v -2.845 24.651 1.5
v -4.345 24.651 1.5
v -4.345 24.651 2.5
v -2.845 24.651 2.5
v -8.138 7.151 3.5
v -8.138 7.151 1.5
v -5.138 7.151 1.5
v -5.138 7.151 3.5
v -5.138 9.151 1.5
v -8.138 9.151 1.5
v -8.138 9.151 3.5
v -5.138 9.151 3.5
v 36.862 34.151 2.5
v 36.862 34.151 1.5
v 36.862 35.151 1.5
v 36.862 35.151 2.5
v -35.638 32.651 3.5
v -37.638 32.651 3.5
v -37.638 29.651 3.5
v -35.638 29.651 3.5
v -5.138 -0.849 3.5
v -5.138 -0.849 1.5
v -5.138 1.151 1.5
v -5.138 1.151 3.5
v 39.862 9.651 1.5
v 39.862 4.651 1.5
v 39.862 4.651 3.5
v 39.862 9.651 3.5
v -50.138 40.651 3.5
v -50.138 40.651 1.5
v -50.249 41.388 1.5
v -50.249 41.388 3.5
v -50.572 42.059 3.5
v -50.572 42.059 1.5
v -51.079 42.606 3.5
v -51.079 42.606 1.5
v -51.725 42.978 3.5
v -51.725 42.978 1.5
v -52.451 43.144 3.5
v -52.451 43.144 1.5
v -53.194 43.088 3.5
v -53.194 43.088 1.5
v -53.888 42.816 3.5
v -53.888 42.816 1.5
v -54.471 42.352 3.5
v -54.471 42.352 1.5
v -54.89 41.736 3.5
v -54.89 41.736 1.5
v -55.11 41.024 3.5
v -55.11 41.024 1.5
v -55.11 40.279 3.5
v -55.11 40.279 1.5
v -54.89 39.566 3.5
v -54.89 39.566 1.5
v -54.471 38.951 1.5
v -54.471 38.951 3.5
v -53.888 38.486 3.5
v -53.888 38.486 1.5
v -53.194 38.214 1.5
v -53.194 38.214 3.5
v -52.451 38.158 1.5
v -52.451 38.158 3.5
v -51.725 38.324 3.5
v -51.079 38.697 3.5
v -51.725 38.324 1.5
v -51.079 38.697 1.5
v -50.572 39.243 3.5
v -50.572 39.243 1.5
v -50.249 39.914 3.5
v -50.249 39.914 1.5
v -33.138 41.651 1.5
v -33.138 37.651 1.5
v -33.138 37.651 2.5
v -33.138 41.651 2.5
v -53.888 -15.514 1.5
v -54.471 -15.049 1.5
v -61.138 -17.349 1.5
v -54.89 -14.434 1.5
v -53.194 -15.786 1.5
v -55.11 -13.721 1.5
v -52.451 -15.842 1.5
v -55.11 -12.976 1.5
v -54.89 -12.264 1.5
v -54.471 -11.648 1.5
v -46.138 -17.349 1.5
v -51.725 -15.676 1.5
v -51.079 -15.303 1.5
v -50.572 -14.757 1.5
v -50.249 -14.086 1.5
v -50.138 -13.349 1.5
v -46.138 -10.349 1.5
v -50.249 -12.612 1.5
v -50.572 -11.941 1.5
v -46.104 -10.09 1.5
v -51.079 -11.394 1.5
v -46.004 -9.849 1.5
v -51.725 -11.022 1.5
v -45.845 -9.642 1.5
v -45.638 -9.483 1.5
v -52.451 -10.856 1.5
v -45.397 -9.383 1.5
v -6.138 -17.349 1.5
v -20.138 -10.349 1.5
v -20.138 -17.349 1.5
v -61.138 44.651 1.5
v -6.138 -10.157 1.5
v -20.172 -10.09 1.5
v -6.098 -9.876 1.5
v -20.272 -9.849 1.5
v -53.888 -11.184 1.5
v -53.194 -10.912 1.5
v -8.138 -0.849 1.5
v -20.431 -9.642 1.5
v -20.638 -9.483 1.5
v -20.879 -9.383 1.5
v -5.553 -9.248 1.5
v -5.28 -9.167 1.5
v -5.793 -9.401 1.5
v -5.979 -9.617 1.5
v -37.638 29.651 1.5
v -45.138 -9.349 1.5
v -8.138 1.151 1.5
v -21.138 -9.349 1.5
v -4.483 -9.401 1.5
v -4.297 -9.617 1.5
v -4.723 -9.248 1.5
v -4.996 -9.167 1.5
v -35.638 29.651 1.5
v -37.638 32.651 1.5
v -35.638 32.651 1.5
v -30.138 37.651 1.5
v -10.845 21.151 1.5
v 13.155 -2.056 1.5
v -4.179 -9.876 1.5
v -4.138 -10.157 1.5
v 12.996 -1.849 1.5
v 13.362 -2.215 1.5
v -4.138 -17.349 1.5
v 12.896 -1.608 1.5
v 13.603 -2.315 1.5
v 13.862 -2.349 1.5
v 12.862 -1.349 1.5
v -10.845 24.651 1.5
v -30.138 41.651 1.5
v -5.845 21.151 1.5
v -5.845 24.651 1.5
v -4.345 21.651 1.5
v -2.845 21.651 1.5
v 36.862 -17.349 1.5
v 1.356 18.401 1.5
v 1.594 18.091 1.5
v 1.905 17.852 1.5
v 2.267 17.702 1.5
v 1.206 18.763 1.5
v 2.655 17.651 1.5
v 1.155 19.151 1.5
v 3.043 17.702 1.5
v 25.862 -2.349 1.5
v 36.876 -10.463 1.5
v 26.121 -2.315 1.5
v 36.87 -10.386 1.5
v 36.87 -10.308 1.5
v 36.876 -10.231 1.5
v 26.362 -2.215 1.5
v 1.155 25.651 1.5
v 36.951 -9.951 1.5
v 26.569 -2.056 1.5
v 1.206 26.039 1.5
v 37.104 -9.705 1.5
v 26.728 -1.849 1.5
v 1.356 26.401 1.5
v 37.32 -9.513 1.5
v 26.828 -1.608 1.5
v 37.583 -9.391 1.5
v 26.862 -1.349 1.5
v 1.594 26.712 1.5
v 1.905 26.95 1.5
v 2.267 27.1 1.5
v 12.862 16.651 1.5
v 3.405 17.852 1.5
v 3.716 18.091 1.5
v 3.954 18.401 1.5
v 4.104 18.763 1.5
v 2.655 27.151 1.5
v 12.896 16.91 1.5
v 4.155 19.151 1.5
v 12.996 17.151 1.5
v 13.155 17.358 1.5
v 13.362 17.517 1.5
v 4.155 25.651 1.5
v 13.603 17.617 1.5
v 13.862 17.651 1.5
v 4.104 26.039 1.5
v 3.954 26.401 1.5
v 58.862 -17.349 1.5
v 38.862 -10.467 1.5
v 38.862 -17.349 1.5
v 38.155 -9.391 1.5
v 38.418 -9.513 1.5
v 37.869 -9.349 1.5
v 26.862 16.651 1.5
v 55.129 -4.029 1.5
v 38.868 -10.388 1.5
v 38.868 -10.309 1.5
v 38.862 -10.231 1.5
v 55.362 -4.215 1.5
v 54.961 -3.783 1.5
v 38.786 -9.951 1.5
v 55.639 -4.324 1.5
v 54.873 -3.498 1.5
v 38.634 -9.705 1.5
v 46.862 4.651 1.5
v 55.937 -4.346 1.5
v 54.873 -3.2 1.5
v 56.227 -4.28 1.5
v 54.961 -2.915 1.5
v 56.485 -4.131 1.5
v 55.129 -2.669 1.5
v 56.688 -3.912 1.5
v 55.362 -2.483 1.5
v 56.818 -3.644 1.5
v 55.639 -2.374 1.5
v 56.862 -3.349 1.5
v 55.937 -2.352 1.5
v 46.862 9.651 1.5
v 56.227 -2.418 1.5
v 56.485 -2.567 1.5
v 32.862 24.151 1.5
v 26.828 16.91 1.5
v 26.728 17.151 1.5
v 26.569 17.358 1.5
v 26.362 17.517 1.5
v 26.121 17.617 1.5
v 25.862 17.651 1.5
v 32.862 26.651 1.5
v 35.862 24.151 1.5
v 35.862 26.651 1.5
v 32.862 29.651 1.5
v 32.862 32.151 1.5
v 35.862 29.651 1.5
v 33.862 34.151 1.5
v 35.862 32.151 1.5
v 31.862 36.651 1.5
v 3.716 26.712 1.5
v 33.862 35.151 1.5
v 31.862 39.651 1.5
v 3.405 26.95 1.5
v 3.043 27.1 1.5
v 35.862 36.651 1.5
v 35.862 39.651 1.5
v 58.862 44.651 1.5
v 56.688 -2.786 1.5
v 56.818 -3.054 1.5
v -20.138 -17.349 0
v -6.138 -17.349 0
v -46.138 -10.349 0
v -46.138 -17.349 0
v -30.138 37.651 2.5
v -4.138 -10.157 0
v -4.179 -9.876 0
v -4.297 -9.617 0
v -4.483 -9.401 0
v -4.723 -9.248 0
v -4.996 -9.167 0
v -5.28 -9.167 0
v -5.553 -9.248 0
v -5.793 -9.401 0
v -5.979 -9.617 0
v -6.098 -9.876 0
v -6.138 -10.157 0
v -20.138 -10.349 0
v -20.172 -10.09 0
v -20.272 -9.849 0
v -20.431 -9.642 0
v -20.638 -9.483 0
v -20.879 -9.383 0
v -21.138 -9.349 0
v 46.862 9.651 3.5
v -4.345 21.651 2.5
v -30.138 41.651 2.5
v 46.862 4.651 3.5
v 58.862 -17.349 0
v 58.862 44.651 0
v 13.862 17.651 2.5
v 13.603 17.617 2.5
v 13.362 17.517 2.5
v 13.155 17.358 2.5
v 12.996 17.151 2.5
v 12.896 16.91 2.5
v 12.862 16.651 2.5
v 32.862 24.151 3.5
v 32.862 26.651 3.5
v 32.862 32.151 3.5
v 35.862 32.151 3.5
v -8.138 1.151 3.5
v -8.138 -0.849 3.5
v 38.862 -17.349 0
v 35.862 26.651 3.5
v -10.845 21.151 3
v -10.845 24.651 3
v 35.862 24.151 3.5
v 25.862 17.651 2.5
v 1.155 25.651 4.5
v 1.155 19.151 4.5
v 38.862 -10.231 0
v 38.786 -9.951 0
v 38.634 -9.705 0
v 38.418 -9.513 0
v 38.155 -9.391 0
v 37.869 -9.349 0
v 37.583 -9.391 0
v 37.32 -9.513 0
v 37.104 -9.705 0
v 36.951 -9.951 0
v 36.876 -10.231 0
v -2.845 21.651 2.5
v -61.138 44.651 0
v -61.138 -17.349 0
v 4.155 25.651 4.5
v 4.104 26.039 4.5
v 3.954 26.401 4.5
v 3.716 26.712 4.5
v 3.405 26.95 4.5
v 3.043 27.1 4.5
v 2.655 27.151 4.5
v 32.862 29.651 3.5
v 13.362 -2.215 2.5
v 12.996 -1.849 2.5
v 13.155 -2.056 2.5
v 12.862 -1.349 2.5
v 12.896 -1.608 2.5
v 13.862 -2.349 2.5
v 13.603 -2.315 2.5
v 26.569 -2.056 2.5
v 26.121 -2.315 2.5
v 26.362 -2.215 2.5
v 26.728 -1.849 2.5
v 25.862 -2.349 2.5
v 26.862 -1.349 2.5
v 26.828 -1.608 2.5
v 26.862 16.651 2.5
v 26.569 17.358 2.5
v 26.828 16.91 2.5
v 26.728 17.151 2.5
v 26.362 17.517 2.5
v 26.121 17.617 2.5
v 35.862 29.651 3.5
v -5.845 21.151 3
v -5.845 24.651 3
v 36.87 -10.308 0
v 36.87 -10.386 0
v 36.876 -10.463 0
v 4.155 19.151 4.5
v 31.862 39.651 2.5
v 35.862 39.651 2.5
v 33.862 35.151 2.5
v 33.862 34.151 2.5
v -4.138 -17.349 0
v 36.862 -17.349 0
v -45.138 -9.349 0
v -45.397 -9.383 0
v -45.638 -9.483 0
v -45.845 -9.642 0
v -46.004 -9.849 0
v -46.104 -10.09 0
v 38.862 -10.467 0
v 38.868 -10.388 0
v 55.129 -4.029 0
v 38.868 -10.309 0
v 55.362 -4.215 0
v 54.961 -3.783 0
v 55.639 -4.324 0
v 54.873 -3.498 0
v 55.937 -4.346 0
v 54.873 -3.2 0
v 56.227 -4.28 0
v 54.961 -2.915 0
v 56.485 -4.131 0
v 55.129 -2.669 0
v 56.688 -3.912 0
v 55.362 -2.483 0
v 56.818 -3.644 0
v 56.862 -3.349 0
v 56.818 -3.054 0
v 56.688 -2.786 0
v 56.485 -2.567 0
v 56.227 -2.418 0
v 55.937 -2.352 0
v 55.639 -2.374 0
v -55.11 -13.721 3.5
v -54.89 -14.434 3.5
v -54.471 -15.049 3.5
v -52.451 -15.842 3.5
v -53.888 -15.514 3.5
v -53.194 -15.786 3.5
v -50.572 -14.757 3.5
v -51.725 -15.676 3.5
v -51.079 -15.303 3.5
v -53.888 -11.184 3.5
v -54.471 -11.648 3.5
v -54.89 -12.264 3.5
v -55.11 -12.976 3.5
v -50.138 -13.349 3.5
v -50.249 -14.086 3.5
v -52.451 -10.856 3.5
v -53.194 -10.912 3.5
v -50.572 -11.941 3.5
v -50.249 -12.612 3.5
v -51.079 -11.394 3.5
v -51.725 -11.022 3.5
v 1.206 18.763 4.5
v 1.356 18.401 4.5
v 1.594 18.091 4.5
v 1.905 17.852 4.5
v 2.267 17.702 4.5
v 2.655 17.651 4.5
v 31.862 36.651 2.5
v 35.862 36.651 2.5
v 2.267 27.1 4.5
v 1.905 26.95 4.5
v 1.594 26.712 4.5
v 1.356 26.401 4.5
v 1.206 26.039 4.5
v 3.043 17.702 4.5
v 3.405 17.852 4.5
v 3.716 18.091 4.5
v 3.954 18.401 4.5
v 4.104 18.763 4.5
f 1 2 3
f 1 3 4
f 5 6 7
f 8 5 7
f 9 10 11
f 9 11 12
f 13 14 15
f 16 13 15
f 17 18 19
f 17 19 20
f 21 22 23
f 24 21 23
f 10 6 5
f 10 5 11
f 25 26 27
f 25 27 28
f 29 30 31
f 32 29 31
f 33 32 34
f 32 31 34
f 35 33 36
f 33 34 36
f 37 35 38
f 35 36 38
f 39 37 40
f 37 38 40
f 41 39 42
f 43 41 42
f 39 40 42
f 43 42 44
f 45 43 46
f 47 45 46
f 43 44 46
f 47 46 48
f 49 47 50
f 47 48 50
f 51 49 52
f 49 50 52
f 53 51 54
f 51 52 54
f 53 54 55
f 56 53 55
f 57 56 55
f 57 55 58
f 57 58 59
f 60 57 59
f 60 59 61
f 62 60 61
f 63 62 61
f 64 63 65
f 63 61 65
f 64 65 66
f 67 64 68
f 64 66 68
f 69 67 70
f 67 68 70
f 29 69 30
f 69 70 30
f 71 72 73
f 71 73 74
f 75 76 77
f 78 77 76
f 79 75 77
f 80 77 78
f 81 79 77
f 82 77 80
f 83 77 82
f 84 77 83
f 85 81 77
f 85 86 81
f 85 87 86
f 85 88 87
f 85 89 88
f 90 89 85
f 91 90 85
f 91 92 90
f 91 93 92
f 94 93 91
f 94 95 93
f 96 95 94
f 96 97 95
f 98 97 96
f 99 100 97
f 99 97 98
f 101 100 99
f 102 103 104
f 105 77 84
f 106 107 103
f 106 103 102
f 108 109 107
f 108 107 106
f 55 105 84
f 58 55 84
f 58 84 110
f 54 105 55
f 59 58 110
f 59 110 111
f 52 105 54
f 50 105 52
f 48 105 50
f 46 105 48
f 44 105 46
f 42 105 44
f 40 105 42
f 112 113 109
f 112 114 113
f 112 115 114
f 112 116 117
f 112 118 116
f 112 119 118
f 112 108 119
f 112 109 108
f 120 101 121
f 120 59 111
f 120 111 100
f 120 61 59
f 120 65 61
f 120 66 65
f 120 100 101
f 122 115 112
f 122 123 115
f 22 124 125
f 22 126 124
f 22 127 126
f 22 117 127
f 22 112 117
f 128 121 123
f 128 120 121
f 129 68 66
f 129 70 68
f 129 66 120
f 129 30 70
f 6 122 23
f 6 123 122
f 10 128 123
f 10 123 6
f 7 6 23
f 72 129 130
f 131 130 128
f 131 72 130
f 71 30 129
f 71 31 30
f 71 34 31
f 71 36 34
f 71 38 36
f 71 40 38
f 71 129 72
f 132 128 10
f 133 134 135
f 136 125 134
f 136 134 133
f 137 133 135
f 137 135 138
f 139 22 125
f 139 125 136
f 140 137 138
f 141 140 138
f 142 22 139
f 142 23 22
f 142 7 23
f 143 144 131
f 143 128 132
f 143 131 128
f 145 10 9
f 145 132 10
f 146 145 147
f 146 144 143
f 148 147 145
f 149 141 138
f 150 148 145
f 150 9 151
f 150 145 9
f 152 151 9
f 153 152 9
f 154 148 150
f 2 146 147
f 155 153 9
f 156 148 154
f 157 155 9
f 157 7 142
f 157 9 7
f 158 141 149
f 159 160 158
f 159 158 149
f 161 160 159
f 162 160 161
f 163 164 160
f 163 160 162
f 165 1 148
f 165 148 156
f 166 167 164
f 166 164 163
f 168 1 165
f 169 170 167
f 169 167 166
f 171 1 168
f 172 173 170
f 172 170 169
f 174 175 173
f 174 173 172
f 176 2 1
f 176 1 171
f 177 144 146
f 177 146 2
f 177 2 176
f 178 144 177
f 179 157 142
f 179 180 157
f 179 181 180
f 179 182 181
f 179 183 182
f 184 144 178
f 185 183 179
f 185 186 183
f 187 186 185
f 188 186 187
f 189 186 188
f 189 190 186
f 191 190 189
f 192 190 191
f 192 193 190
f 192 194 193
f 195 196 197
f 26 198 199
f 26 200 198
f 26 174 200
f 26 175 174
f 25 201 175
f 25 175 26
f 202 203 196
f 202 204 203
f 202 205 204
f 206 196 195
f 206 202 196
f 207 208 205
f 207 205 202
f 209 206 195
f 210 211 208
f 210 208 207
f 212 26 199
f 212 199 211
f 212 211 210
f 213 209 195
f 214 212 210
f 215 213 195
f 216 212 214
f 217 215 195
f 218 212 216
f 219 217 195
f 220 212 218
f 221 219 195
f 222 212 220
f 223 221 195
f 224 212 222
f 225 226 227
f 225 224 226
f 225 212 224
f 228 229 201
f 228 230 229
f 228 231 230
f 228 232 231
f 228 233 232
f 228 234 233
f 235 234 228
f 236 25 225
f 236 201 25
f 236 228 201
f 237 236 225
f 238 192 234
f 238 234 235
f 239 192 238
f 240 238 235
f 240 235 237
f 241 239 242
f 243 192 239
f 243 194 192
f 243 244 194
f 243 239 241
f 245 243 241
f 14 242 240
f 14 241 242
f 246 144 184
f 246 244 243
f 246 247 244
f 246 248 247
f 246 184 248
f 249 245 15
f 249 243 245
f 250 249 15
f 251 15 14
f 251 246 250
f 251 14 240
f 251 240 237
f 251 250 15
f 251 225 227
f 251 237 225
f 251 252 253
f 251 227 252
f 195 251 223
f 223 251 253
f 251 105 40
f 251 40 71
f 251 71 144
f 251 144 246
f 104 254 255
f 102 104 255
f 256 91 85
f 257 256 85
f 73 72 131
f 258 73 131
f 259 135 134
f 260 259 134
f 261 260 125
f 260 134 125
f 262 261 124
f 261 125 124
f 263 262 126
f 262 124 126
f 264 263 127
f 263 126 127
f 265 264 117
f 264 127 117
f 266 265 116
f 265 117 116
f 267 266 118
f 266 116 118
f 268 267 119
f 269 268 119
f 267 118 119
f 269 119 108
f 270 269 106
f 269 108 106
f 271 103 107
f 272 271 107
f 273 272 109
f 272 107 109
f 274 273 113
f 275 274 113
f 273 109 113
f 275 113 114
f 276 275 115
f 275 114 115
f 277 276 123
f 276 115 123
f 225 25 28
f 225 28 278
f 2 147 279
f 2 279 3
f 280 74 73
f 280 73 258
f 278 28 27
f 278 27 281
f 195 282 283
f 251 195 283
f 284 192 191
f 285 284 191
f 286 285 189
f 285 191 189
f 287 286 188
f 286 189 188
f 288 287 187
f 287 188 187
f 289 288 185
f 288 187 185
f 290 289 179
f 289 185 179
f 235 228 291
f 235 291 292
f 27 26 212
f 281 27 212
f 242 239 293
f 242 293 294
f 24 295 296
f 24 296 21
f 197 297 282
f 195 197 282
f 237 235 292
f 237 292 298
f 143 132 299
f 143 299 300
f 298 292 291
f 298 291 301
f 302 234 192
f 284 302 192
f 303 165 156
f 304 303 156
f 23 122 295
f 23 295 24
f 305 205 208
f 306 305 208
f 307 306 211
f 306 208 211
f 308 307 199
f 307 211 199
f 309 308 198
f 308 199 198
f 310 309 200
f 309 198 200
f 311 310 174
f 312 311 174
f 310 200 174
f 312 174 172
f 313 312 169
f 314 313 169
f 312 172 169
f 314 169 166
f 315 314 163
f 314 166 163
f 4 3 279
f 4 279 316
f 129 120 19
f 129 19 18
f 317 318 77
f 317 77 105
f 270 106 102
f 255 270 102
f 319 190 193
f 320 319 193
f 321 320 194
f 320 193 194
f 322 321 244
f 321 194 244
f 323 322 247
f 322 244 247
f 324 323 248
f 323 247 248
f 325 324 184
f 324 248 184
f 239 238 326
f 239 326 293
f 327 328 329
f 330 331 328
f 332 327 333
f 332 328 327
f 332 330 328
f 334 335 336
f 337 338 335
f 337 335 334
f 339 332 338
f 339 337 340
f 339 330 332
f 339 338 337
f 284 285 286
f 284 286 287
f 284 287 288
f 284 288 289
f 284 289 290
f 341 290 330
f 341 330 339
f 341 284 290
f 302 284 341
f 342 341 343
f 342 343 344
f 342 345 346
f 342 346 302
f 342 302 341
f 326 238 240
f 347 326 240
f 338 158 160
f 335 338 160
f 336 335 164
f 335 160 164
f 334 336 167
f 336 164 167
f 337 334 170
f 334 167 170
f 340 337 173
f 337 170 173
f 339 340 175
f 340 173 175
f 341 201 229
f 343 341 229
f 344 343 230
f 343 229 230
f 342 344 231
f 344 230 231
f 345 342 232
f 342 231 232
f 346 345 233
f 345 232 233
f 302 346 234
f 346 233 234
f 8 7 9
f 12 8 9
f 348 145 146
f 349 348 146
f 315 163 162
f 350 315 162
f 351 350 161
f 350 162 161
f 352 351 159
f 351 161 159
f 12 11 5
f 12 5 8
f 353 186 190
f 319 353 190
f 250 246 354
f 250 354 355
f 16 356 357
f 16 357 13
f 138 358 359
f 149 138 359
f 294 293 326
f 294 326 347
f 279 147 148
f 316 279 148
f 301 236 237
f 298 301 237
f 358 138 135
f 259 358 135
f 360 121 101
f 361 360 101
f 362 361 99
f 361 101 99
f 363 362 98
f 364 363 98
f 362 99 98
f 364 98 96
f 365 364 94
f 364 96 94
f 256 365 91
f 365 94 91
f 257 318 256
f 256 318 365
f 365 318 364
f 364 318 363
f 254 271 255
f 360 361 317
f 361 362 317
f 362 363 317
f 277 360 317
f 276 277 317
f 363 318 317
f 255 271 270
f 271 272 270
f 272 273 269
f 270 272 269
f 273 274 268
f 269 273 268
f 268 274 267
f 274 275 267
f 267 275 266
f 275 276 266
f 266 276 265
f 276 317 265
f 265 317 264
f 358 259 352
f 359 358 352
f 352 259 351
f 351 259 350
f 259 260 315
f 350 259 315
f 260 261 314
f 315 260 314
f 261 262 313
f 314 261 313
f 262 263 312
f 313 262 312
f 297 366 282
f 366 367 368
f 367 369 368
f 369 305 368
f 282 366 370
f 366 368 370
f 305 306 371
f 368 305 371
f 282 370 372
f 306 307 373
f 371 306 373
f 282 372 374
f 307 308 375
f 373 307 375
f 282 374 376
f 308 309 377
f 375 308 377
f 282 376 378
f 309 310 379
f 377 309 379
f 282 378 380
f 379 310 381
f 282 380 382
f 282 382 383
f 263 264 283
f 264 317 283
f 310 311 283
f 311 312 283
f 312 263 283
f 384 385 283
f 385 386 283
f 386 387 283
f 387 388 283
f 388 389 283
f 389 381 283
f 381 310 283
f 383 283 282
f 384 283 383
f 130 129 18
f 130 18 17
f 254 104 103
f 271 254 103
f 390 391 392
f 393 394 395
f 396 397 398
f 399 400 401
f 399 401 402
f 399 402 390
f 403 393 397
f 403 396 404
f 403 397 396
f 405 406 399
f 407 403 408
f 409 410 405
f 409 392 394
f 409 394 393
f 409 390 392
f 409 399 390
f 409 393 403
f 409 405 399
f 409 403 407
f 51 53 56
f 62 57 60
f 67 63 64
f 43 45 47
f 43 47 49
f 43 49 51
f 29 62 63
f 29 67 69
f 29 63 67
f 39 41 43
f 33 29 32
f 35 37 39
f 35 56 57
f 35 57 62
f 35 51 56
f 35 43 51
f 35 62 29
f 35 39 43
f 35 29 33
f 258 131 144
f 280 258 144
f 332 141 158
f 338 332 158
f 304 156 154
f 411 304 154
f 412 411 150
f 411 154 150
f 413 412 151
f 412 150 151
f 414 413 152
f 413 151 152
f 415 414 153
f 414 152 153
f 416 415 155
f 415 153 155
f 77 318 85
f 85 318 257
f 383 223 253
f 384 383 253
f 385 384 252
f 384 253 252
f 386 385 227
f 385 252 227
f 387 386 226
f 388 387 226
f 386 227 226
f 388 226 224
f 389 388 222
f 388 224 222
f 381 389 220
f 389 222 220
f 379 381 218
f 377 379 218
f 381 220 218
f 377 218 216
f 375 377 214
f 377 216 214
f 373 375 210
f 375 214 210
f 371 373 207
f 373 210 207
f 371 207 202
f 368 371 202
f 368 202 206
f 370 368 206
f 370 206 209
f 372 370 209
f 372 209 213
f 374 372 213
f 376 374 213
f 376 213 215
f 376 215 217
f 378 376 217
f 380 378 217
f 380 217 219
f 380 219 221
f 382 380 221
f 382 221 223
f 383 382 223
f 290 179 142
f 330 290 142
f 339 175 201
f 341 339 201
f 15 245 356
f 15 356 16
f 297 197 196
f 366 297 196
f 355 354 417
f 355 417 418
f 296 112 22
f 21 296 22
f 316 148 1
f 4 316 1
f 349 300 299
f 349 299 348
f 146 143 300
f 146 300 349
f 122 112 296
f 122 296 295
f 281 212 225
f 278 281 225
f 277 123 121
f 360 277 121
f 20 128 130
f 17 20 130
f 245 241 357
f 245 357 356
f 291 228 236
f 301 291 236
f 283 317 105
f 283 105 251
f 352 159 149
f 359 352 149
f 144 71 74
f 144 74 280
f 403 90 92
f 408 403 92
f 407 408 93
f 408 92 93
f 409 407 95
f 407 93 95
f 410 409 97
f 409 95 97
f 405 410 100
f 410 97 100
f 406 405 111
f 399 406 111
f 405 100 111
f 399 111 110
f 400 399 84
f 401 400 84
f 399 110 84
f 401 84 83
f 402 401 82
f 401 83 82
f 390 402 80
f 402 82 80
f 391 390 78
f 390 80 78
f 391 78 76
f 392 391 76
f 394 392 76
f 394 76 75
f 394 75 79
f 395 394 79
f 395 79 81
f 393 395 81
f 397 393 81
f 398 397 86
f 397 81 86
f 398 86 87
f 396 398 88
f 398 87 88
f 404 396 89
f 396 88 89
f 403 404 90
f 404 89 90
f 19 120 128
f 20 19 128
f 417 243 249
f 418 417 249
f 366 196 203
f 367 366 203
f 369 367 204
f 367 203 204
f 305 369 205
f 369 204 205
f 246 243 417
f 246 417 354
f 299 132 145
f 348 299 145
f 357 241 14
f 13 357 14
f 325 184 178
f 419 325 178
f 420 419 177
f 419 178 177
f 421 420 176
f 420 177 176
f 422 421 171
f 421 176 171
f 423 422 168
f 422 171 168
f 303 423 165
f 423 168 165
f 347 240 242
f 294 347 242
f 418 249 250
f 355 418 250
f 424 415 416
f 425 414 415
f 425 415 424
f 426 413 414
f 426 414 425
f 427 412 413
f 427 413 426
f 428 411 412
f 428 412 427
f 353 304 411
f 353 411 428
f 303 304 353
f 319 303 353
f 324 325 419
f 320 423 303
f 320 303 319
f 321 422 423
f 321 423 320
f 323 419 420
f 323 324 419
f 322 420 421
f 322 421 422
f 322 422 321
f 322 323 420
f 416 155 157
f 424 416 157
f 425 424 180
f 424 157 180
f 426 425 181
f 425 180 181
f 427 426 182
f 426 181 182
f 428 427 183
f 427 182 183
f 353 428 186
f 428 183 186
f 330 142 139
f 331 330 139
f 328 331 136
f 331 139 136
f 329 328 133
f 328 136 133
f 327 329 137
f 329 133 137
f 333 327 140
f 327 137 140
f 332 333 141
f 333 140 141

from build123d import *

# Parameters (mm, degrees)
F0_W      = 120
F0_H      = 62
F1_DEPTH  = 1.5
F3_DEPTH  = 1.501
F5_DEPTH  = 1.501
F7_DEPTH  = 1.501
F8_R      = 1
F9_DEPTH  = 1.501
F10_W     = 7
F10_H     = 5
F11_DEPTH = 2
F13_DEPTH = 1
F14_W     = 3
F14_H     = 2.5
F15_DEPTH = 2
F16_W     = 3
F16_H     = 2.5
F17_DEPTH = 2
F18_W     = 3
F18_H     = 1
F19_DEPTH = 1
F20_W     = 4
F20_H     = 3
F21_DEPTH = 1
F23_DEPTH = 3
F24_W     = 1.5
F24_H     = 3
F25_DEPTH = 1
F26_W     = 5
F26_H     = 3.5
F27_DEPTH = 1.5
F28_W     = 3
F28_H     = 2
F29_DEPTH = 2
F30_W     = 3
F30_H     = 2
F31_DEPTH = 2
F32_R     = 2.5
F33_DEPTH = 2
F34_R     = 2.5
F35_DEPTH = 2
F36_W     = 3
F36_H     = 4
F37_DEPTH = 1
F38_W     = 2
F38_H     = 3
F39_DEPTH = 2


with BuildPart() as f1:
    # F0 (on Top) → F1 (new body)
    with BuildSketch(Plane.XY):
        with Locations((-1.138048, 13.651166)):
            Rectangle(F0_W, F0_H)
    extrude(amount=F1_DEPTH)

    # F2 (on face) → F3 (cut, through all)
    with BuildSketch(Plane.XY.offset(1.5)):
        with BuildLine():
            Line((-46.138048, -10.348834), (-46.138048, -17.348834))
            Line((-46.138048, -17.348834), (-20.138048, -17.348834))
            Line((-20.138048, -17.348834), (-20.138048, -10.348834))
            ThreePointArc((-20.138048, -10.348834), (-20.430941, -9.641727), (-21.138048, -9.348834))
            Line((-21.138048, -9.348834), (-45.138048, -9.348834))
            ThreePointArc((-45.138048, -9.348834), (-45.845155, -9.641727), (-46.138048, -10.348834))
        make_face()
    extrude(amount=-F3_DEPTH, mode=Mode.SUBTRACT)

    # F4 (on face) → F5 (cut, through all)
    with BuildSketch(Plane.XY.offset(1.5)):
        with BuildLine():
            Line((-6.138048, -10.157242), (-6.138048, -17.348834))
            Line((-6.138048, -17.348834), (-4.138048, -17.348834))
            Line((-4.138048, -17.348834), (-4.138048, -10.157242))
            ThreePointArc((-4.138048, -10.157242), (-5.138048, -9.157242), (-6.138048, -10.157242))
        make_face()
    extrude(amount=-F5_DEPTH, mode=Mode.SUBTRACT)

    # F6 (on face) → F7 (cut, through all)
    with BuildSketch(Plane.XY.offset(1.5)):
        with BuildLine():
            ThreePointArc((38.861952, -10.467094), (38.868969, -10.348834), (38.861952, -10.230573))
            Line((38.861952, -10.230573), (38.861952, -10.467094))
        make_face()
        with BuildLine():
            Line((36.875528, -10.463178), (36.875987, -10.230573))
            ThreePointArc((36.875987, -10.230573), (36.868971, -10.346862), (36.875528, -10.463178))
        make_face()
        with BuildLine():
            Line((38.861952, -10.467094), (38.861952, -10.230573))
            ThreePointArc((38.861952, -10.230573), (37.868969, -9.348834), (36.875987, -10.230573))
            Line((36.875987, -10.230573), (36.875528, -10.463178))
            Line((36.875528, -10.463178), (36.861952, -17.348834))
            Line((36.861952, -17.348834), (38.861952, -17.348834))
            Line((38.861952, -17.348834), (38.861952, -10.467094))
        make_face()
    extrude(amount=-F7_DEPTH, mode=Mode.SUBTRACT)

    # F8 (on face) → F9 (cut, through all)
    with BuildSketch(Plane.XY.offset(1.5)):
        with Locations((55.861952, -3.348834)):
            Circle(F8_R)
    extrude(amount=-F9_DEPTH, mode=Mode.SUBTRACT)

    # F10 (on face) → F11 (join)
    with BuildSketch(Plane.XY.offset(1.5)):
        with Locations((43.361952, 7.151166)):
            Rectangle(F10_W, F10_H)
    extrude(amount=F11_DEPTH)

    # F12 (on face) → F13 (join)
    with BuildSketch(Plane.XY.offset(1.5)):
        with BuildLine():
            Line((25.861952, 17.651166), (13.861952, 17.651166))
            ThreePointArc((13.861952, 17.651166), (13.154845, 17.358273), (12.861952, 16.651166))
            Line((12.861952, 16.651166), (12.861952, -1.348834))
            ThreePointArc((12.861952, -1.348834), (13.154845, -2.05594), (13.861952, -2.348834))
            Line((13.861952, -2.348834), (25.861952, -2.348834))
            ThreePointArc((25.861952, -2.348834), (26.569059, -2.05594), (26.861952, -1.348834))
            Line((26.861952, -1.348834), (26.861952, 16.651166))
            ThreePointArc((26.861952, 16.651166), (26.569059, 17.358273), (25.861952, 17.651166))
        make_face()
    extrude(amount=F13_DEPTH)

    # F14 (on face) → F15 (join)
    with BuildSketch(Plane.XY.offset(1.5)):
        with Locations((34.361952, 25.401166)):
            Rectangle(F14_W, F14_H)
    extrude(amount=F15_DEPTH)

    # F16 (on face) → F17 (join)
    with BuildSketch(Plane.XY.offset(1.5)):
        with Locations((34.361952, 30.901166)):
            Rectangle(F16_W, F16_H)
    extrude(amount=F17_DEPTH)

    # F18 (on face) → F19 (join)
    with BuildSketch(Plane.XY.offset(1.5)):
        with Locations((35.361952, 34.651166)):
            Rectangle(F18_W, F18_H)
    extrude(amount=F19_DEPTH)

    # F20 (on face) → F21 (join)
    with BuildSketch(Plane.XY.offset(1.5)):
        with Locations((33.861952, 38.151166)):
            Rectangle(F20_W, F20_H)
    extrude(amount=F21_DEPTH)

    # F22 (on face) → F23 (join)
    with BuildSketch(Plane.XY.offset(1.5)):
        with BuildLine():
            ThreePointArc((2.654845, 27.151166), (1.594185, 26.711826), (1.154845, 25.651166))
            Line((1.154845, 25.651166), (1.154845, 19.151166))
            ThreePointArc((1.154845, 19.151166), (1.594185, 18.090506), (2.654845, 17.651166))
            ThreePointArc((2.654845, 17.651166), (3.715505, 18.090506), (4.154845, 19.151166))
            Line((4.154845, 19.151166), (4.154845, 25.651166))
            ThreePointArc((4.154845, 25.651166), (3.715505, 26.711826), (2.654845, 27.151166))
        make_face()
    extrude(amount=F23_DEPTH)

    # F24 (on face) → F25 (join)
    with BuildSketch(Plane.XY.offset(1.5)):
        with Locations((-3.595155, 23.151166)):
            Rectangle(F24_W, F24_H)
    extrude(amount=F25_DEPTH)

    # F26 (on face) → F27 (join)
    with BuildSketch(Plane.XY.offset(1.5)):
        with Locations((-8.345155, 22.901166)):
            Rectangle(F26_W, F26_H)
    extrude(amount=F27_DEPTH)

    # F28 (on face) → F29 (join)
    with BuildSketch(Plane.XY.offset(1.5)):
        with Locations((-6.638048, 8.151166)):
            Rectangle(F28_W, F28_H)
    extrude(amount=F29_DEPTH)

    # F30 (on face) → F31 (join)
    with BuildSketch(Plane.XY.offset(1.5)):
        with Locations((-6.638048, 0.151166)):
            Rectangle(F30_W, F30_H)
    extrude(amount=F31_DEPTH)

    # F32 (on face) → F33 (join)
    with BuildSketch(Plane.XY.offset(1.5)):
        with Locations((-52.638048, 40.651166)):
            Circle(F32_R)
    extrude(amount=F33_DEPTH)

    # F34 (on face) → F35 (join)
    with BuildSketch(Plane.XY.offset(1.5)):
        with Locations((-52.638048, -13.348834)):
            Circle(F34_R)
    extrude(amount=F35_DEPTH)

    # F36 (on face) → F37 (join)
    with BuildSketch(Plane.XY.offset(1.5)):
        with Locations((-31.638048, 39.651166)):
            Rectangle(F36_W, F36_H)
    extrude(amount=F37_DEPTH)

    # F38 (on face) → F39 (join)
    with BuildSketch(Plane.XY.offset(1.5)):
        with Locations((-36.638048, 31.151166)):
            Rectangle(F38_W, F38_H)
    extrude(amount=F39_DEPTH)


solid = f1.part
